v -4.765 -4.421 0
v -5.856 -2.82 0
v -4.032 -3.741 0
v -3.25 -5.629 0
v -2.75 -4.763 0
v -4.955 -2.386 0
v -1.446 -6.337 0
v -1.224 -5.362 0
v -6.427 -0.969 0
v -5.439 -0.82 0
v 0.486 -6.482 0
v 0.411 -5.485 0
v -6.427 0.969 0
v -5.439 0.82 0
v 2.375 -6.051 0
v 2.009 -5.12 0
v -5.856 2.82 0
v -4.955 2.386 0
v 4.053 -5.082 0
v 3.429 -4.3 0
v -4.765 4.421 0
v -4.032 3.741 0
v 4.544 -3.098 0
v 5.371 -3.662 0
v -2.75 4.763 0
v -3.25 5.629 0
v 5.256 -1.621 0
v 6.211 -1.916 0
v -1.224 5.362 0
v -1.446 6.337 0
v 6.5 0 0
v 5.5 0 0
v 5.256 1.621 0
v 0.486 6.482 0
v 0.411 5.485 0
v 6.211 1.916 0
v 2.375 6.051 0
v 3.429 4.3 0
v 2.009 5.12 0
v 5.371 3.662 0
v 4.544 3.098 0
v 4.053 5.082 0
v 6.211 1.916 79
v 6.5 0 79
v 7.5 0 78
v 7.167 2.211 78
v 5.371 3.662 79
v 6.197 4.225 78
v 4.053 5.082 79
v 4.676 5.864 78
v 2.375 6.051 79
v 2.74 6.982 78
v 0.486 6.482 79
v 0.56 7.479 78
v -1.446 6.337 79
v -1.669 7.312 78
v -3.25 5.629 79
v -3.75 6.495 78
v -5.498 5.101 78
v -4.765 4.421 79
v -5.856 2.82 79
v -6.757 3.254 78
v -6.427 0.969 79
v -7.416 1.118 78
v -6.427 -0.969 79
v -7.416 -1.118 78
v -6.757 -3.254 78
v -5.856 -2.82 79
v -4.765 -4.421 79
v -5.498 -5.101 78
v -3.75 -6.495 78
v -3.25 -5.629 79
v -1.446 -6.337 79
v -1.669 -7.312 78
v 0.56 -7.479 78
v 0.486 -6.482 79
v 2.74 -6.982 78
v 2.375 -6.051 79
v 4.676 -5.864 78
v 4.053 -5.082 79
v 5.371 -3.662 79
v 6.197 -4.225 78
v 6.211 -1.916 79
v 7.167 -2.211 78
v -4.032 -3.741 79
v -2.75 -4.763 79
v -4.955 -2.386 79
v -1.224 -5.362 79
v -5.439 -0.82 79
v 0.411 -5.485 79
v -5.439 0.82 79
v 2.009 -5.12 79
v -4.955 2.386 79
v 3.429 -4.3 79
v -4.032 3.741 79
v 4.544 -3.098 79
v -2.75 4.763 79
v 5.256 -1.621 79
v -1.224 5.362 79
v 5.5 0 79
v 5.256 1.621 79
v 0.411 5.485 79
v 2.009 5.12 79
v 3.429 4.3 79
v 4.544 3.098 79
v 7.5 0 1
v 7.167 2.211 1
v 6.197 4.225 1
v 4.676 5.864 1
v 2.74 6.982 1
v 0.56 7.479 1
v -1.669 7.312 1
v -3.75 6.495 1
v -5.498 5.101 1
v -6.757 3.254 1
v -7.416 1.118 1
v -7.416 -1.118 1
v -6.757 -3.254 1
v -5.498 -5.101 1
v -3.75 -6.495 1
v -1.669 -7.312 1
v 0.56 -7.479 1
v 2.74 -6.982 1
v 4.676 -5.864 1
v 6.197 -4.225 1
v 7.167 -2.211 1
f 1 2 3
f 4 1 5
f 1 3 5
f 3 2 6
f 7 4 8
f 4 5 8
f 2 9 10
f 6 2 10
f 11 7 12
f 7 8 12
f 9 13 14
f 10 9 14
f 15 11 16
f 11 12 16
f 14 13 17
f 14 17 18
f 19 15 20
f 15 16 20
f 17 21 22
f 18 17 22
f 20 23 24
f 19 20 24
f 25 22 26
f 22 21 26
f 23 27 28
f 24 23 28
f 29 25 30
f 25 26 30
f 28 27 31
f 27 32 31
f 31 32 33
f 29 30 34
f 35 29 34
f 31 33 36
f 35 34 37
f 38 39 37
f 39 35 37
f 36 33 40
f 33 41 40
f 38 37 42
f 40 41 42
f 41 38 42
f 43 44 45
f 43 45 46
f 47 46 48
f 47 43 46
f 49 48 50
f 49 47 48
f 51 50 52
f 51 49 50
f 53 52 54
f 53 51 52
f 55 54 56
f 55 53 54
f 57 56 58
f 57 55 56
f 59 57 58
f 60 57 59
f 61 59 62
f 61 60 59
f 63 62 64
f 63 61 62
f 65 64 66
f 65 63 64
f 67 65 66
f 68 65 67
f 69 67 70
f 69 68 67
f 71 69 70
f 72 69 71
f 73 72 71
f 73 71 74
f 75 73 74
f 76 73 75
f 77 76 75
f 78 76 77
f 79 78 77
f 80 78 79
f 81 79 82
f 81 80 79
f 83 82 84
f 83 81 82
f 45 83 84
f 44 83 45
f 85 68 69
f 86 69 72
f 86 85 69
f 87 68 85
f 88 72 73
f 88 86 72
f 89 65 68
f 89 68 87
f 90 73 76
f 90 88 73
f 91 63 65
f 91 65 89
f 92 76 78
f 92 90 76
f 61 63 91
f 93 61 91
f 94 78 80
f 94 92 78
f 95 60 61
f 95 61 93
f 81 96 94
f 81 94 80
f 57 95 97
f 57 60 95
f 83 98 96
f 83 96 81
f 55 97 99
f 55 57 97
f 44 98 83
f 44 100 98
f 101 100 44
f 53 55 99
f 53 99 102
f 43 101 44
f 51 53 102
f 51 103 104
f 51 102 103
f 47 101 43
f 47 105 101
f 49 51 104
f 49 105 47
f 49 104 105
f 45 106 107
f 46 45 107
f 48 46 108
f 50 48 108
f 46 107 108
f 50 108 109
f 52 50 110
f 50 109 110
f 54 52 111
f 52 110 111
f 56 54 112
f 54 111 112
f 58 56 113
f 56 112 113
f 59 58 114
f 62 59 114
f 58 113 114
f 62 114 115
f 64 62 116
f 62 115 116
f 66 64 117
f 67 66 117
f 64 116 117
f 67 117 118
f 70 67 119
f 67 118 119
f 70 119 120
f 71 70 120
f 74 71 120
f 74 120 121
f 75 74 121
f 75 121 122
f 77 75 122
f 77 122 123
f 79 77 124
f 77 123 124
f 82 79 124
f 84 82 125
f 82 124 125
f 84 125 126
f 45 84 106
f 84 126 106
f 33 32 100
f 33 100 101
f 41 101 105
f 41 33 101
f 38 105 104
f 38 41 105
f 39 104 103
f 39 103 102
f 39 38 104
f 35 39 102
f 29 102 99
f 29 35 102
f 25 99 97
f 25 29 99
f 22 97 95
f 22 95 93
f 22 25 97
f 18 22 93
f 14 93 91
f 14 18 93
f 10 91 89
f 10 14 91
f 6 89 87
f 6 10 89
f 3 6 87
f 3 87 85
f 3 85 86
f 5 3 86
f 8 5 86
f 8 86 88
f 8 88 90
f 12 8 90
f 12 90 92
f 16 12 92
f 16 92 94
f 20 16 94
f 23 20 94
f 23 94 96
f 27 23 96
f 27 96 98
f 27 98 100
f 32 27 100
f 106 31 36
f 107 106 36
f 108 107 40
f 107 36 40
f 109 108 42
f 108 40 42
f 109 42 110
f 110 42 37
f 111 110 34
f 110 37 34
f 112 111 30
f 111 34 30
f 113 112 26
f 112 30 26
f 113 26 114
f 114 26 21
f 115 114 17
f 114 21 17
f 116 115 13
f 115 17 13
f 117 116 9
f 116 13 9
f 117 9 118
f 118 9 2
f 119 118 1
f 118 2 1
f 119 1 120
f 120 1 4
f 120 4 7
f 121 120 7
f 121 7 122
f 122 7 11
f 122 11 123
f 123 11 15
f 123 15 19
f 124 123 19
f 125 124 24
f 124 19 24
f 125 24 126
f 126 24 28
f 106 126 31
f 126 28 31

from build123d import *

# Parameters (mm, degrees)
F0_R     = 7.5
F1_DEPTH = 79
F2_T     = -2
F3_SIZE  = 1


with BuildPart() as f1:
    # F0 (on Top) → F1 (new body)
    with BuildSketch(Plane.XY):
        Circle(F0_R)
    extrude(amount=F1_DEPTH)

    # F2
    f2_openings = [f1.faces().sort_by_distance(p)[0] for p in [
        (0, 0, 79),
        (0, 0, 0),
    ]]
    offset(amount=F2_T, openings=f2_openings)

    # F3
    f3_edges = [f1.edges().sort_by_distance(p)[0] for p in [
        (-7.5, 0, 0),
        (-7.5, 0, 79),
    ]]
    chamfer(f3_edges, length=F3_SIZE)


solid = f1.part
